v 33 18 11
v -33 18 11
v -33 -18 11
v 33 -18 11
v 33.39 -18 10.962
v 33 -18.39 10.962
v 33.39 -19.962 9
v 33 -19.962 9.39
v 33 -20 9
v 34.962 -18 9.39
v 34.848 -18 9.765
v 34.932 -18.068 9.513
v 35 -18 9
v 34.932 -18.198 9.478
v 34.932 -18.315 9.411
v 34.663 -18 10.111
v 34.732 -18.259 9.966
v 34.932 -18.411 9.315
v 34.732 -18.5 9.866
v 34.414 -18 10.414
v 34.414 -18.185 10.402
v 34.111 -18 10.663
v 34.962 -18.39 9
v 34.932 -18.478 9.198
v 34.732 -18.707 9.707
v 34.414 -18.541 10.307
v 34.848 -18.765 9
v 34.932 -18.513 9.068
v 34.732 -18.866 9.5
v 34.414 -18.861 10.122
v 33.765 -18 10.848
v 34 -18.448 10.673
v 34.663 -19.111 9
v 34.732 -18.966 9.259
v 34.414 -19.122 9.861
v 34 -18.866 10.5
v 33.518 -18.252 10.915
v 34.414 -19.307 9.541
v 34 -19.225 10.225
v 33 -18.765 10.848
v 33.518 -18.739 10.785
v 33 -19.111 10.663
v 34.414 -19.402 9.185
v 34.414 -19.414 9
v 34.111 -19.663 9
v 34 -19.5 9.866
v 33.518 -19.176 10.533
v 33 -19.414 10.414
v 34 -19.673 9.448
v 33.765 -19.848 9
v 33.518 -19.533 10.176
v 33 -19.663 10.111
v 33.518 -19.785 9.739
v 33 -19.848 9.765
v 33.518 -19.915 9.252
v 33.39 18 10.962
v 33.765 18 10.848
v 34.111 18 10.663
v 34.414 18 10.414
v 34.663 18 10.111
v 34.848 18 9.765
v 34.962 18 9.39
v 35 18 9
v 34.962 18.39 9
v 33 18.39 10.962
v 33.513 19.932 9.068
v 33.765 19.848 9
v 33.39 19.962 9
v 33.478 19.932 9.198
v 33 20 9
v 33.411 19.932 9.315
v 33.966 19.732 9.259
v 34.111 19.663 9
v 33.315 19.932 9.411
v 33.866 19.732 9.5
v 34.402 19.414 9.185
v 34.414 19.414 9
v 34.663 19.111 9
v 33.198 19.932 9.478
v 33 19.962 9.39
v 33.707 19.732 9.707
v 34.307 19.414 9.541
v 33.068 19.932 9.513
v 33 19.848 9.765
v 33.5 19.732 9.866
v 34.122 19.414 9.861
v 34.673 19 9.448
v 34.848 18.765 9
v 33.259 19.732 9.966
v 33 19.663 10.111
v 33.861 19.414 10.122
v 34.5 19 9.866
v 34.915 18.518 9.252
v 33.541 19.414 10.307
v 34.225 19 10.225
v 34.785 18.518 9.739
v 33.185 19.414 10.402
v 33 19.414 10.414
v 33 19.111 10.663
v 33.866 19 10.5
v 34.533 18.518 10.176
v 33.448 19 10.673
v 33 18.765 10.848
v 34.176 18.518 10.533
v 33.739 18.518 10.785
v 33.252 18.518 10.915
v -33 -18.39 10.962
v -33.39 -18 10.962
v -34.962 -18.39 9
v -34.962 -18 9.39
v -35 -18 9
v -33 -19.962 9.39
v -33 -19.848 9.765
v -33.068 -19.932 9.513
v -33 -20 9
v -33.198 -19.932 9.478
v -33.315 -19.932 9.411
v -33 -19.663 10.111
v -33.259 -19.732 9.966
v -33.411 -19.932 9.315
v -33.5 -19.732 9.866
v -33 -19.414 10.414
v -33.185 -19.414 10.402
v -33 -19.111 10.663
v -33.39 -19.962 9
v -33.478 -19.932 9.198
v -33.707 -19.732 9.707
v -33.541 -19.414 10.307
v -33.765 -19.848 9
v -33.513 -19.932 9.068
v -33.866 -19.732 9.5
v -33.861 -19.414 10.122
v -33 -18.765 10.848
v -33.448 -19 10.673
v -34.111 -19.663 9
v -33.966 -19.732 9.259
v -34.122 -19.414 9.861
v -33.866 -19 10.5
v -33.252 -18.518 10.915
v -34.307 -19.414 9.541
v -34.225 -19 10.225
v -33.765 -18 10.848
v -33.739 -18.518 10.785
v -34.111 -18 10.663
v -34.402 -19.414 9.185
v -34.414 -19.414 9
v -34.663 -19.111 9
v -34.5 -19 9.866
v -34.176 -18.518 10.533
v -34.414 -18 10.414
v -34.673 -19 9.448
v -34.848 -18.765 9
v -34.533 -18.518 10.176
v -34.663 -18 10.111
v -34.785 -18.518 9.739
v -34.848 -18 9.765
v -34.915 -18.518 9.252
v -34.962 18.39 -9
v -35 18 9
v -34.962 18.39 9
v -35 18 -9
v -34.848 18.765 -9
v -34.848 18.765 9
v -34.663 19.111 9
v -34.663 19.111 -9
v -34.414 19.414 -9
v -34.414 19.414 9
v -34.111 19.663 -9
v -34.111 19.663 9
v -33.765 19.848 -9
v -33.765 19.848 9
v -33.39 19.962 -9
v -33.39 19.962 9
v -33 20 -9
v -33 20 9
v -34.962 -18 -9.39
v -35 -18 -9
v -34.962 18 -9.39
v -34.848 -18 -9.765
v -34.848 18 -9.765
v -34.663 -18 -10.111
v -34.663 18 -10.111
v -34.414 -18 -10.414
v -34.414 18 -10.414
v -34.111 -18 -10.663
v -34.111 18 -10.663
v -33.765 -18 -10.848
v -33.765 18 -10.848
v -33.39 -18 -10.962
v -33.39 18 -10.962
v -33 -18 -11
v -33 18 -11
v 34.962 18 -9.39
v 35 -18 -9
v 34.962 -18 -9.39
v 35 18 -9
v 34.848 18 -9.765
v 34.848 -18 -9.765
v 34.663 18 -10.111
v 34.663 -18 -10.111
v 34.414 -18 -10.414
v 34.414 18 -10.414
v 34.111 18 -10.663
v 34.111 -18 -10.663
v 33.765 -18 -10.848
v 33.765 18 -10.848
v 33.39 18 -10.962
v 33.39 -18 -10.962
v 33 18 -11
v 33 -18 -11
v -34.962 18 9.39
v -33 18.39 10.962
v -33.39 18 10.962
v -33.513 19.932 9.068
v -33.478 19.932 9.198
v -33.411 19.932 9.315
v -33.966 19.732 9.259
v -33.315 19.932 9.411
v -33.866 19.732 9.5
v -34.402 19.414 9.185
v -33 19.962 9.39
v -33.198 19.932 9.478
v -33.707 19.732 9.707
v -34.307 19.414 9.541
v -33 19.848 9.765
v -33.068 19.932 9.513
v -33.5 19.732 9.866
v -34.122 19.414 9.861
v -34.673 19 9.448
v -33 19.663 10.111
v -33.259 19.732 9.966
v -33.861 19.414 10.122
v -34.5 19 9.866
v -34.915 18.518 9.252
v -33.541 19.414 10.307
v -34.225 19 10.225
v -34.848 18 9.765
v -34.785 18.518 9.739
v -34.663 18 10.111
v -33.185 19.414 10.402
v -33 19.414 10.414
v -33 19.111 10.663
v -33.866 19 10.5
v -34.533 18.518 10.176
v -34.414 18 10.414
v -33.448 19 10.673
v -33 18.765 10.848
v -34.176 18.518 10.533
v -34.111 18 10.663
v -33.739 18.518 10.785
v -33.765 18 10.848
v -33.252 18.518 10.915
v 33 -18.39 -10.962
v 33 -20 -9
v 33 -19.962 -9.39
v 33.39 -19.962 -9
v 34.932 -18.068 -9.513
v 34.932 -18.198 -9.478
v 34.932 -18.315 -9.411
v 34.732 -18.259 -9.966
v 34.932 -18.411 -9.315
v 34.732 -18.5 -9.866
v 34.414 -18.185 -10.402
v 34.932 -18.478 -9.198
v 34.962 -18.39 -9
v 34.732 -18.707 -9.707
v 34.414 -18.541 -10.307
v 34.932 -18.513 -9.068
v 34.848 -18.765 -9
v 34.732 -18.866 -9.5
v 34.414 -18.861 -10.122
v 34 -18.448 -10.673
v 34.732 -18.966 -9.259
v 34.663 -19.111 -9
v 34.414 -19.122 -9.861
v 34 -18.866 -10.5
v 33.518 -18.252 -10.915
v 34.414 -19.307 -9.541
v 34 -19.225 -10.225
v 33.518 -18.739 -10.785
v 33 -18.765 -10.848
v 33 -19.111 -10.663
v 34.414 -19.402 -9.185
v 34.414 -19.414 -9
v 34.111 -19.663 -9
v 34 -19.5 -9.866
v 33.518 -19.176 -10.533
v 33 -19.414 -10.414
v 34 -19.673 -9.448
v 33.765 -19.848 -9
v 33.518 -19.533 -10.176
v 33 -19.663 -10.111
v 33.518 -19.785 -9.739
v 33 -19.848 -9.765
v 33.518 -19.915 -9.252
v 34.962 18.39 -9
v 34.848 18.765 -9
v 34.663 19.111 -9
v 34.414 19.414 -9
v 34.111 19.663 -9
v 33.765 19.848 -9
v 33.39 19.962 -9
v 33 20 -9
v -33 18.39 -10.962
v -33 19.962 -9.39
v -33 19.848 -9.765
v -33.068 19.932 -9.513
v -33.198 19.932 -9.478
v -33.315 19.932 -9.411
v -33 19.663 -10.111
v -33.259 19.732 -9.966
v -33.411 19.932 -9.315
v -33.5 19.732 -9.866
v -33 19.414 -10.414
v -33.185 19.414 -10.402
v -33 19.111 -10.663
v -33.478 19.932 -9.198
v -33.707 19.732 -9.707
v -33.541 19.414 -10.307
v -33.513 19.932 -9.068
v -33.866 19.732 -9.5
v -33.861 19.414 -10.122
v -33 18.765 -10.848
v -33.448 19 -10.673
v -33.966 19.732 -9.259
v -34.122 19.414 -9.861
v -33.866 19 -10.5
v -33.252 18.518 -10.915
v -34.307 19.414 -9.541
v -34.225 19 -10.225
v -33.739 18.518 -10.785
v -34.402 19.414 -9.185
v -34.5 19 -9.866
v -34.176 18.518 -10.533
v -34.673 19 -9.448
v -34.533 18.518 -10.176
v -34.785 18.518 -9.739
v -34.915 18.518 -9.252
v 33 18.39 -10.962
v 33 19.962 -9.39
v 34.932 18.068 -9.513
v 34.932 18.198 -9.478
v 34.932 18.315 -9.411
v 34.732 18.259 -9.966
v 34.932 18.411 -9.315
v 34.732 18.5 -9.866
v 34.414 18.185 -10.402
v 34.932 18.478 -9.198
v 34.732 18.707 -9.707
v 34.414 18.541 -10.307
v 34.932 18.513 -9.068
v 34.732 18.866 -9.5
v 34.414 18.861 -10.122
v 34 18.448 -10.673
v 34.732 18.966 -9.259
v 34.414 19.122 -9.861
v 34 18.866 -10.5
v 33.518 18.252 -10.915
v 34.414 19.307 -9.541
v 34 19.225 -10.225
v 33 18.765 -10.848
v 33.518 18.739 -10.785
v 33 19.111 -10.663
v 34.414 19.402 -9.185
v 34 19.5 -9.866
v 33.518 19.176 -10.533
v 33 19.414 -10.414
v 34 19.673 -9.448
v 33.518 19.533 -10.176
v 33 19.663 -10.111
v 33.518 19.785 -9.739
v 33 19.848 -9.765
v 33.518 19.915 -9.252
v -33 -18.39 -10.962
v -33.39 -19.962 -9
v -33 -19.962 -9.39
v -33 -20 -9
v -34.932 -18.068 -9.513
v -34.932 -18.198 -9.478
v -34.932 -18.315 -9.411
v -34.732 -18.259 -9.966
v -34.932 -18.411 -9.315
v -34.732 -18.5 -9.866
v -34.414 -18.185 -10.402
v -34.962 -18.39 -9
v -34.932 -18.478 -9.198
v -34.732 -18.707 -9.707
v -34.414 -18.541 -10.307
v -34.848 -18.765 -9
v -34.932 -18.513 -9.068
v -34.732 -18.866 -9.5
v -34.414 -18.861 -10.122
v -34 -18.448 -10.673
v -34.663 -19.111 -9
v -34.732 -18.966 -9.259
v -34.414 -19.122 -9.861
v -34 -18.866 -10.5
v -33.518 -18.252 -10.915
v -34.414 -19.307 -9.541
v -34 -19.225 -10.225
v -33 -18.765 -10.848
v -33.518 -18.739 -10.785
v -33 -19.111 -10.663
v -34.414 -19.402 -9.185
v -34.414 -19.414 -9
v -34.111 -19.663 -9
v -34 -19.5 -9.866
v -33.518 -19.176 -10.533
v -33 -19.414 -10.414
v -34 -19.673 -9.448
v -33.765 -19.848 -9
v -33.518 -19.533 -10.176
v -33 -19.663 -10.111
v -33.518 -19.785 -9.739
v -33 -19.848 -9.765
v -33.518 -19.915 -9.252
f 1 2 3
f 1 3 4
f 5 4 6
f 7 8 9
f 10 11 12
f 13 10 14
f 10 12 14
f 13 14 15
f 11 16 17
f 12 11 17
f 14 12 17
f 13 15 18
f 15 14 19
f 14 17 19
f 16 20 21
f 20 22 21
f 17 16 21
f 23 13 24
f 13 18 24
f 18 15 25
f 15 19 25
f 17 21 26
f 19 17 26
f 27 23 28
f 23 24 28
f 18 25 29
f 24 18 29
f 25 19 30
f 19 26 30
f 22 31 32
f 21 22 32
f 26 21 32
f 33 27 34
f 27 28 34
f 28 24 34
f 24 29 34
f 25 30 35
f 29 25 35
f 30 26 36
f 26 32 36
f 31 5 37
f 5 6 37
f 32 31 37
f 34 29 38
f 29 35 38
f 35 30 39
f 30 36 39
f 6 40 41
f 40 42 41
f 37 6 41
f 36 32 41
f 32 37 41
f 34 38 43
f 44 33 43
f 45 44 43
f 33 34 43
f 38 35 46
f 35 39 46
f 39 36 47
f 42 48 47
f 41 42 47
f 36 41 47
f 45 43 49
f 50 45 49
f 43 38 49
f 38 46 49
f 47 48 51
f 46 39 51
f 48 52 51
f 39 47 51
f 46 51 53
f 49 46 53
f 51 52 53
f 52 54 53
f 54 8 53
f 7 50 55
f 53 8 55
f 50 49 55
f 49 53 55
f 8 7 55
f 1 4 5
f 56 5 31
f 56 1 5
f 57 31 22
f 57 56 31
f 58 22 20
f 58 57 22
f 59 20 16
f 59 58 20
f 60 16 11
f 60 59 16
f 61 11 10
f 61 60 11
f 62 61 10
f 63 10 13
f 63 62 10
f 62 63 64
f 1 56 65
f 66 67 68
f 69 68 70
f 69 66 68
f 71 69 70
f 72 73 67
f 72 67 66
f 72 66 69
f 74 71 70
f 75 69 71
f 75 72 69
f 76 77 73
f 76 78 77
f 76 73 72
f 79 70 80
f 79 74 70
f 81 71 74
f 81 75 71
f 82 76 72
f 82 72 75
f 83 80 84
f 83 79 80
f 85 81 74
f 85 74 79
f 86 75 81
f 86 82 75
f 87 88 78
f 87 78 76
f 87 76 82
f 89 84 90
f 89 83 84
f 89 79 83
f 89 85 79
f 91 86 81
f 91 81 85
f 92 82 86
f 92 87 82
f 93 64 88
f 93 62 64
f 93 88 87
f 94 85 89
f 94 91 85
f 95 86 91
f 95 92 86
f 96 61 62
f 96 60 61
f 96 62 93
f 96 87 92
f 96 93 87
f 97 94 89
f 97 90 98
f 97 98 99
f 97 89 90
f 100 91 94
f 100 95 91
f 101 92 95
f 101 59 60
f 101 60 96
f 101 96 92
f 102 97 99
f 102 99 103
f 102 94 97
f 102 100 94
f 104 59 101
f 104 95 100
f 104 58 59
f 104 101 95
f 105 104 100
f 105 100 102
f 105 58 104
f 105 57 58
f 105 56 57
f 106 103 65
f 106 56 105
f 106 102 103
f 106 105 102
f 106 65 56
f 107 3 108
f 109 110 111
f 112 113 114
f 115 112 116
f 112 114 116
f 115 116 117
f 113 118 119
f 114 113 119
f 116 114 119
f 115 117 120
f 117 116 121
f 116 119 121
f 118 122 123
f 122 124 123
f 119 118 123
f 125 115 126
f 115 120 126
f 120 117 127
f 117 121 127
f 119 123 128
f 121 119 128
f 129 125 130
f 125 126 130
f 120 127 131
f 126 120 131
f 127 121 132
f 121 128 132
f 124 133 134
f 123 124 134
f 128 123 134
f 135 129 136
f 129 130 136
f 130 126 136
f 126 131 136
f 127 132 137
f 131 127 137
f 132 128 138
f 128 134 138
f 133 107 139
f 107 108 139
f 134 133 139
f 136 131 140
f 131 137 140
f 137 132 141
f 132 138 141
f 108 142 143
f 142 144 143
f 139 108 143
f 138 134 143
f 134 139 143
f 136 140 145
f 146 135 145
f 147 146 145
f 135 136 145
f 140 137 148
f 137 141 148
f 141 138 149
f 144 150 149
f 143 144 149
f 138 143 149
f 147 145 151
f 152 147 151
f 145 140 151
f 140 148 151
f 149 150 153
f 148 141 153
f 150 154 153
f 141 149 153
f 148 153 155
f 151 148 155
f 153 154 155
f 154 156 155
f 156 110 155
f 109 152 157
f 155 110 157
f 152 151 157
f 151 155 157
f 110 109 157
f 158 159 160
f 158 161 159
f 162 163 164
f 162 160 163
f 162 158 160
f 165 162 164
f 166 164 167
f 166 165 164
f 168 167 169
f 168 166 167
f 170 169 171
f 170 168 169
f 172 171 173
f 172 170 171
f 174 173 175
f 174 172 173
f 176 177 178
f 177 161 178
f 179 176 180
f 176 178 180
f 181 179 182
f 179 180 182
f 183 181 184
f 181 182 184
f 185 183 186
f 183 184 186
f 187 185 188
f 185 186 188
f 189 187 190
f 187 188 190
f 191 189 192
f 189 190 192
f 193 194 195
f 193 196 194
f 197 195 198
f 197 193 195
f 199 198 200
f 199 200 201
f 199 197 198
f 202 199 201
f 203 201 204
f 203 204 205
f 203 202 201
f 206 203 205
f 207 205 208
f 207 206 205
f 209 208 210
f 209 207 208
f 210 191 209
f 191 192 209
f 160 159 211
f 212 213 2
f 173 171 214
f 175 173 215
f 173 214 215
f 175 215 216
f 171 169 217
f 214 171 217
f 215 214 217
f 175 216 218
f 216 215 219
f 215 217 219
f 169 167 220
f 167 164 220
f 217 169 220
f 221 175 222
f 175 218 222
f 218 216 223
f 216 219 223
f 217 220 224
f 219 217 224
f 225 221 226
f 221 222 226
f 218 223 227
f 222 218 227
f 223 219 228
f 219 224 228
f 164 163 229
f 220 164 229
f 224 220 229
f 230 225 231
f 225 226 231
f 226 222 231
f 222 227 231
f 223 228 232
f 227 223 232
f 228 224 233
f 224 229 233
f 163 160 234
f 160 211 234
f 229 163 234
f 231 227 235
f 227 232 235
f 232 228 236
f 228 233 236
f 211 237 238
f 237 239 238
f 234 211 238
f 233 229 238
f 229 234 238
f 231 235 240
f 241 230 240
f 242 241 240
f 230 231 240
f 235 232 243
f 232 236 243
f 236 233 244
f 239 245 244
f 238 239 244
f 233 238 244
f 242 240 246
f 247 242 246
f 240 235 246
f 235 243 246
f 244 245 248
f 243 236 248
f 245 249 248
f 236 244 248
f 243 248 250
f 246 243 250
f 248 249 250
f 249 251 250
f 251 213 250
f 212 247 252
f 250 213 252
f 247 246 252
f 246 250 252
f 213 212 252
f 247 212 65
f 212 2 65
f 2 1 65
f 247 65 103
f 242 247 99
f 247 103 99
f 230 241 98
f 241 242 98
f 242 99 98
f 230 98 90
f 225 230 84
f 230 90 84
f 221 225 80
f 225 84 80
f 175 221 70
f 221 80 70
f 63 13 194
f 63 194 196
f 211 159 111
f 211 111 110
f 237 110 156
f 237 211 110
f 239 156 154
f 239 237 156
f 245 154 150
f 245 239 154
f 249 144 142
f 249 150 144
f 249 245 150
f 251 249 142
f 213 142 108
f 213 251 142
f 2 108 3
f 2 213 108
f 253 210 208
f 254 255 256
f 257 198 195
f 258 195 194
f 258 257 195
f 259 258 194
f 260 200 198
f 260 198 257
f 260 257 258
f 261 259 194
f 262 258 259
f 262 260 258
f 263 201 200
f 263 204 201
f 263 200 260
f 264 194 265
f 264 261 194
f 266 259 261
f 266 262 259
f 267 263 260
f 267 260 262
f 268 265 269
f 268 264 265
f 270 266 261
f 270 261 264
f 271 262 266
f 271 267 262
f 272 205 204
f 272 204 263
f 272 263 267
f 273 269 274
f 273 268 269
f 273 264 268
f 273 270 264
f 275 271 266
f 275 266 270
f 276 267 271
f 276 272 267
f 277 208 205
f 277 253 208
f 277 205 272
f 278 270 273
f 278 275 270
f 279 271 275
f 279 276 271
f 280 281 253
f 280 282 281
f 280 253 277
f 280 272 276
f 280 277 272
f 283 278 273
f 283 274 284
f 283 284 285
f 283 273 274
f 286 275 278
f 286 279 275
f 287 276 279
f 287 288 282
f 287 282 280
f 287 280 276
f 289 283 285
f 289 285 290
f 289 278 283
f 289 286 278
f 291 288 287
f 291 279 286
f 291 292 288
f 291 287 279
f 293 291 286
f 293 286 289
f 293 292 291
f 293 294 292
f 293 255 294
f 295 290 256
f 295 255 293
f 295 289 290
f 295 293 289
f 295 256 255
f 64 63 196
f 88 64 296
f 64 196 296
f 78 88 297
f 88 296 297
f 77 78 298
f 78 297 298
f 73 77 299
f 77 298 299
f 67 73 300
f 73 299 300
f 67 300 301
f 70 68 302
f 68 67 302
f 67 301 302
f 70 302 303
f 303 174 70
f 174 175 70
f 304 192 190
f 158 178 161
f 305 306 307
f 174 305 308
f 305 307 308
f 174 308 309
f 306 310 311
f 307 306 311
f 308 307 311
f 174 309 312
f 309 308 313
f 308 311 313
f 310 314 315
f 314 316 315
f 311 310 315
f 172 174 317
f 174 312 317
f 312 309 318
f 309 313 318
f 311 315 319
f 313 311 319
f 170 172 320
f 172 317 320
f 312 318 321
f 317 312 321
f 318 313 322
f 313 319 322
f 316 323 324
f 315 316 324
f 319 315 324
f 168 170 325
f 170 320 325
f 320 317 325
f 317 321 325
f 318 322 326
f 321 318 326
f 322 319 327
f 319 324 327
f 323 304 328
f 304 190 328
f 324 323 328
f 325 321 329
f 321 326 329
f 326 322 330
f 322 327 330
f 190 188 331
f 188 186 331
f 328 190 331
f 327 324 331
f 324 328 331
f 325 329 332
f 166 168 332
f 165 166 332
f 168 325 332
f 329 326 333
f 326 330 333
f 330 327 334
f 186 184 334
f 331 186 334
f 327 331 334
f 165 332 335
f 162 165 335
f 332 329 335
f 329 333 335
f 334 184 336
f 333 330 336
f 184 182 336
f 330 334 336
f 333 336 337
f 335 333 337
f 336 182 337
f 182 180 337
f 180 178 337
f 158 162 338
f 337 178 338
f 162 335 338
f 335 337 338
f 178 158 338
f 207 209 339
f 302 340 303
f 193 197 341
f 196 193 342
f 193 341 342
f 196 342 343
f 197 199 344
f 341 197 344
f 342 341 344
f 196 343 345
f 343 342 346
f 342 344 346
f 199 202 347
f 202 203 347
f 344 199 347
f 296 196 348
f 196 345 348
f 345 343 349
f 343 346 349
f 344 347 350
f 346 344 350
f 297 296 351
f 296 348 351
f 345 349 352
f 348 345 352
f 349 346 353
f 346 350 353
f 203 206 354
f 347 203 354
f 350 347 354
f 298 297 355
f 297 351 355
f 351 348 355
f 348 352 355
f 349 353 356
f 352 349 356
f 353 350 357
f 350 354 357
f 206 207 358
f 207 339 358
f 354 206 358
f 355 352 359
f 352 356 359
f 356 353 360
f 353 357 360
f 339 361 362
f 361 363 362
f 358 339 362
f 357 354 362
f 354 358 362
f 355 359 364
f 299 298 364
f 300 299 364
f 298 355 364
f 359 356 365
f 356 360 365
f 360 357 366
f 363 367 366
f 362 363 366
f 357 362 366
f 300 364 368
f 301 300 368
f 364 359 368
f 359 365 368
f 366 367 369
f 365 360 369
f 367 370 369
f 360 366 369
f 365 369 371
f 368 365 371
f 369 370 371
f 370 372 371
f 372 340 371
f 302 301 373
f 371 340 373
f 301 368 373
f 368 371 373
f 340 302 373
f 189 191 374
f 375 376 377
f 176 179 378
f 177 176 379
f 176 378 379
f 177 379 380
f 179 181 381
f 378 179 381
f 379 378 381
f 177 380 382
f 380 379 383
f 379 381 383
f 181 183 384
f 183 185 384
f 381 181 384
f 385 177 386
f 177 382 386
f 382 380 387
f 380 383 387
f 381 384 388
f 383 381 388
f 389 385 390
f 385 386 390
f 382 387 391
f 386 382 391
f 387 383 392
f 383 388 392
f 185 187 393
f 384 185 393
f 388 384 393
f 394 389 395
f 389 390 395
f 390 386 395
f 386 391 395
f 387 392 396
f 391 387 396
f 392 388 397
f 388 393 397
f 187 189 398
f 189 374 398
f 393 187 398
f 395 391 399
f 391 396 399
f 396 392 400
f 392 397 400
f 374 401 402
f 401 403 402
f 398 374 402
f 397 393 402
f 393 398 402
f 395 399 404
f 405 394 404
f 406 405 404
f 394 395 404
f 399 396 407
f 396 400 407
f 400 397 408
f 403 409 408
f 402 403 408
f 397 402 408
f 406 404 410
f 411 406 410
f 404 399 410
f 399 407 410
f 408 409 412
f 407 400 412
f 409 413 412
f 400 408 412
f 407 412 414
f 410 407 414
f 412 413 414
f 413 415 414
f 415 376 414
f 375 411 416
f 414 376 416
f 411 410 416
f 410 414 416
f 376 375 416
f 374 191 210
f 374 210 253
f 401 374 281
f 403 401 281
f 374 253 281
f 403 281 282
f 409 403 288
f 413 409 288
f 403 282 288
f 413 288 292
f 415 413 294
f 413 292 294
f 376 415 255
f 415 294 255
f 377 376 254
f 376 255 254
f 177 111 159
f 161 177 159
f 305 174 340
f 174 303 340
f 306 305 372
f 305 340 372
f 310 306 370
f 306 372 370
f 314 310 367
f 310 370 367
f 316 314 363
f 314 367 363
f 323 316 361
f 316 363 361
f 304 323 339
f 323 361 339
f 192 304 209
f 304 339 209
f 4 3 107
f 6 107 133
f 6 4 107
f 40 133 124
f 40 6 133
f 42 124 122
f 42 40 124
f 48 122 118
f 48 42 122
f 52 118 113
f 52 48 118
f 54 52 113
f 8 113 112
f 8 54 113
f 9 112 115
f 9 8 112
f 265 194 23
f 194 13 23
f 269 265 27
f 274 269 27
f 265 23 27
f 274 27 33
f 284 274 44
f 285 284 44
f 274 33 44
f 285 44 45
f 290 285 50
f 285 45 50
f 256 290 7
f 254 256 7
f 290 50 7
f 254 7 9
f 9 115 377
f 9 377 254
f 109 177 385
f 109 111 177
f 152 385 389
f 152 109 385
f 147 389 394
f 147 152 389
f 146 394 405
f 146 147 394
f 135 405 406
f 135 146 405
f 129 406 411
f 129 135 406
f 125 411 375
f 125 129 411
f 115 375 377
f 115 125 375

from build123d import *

# Parameters (mm, degrees)
SKETCH_1_W      = 70
SKETCH_1_H      = 40
EXTRUDE_1_DEPTH = 11
FILLET_1_R      = 2


with BuildPart() as part:
    # 草图1 → 凸台-拉伸1 (new, symmetric)
    with BuildSketch(Plane.XY):
        Rectangle(SKETCH_1_W, SKETCH_1_H)
    extrude(amount=EXTRUDE_1_DEPTH, both=True)

    # 圆角1
    fillet_1_edges = [part.edges().sort_by_distance(p)[0] for p in [
        (-35, 0, 11),
        (0, -20, 11),
        (35, 0, 11),
        (0, -20, -11),
        (-35, 0, -11),
        (0, 20, -11),
        (35, 0, -11),
        (35, -20, 0),
        (-35, -20, 0),
        (-35, 20, 0),
        (35, 20, 0),
        (0, 20, 11),
    ]]
    fillet(fillet_1_edges, radius=FILLET_1_R)


solid = part.part
